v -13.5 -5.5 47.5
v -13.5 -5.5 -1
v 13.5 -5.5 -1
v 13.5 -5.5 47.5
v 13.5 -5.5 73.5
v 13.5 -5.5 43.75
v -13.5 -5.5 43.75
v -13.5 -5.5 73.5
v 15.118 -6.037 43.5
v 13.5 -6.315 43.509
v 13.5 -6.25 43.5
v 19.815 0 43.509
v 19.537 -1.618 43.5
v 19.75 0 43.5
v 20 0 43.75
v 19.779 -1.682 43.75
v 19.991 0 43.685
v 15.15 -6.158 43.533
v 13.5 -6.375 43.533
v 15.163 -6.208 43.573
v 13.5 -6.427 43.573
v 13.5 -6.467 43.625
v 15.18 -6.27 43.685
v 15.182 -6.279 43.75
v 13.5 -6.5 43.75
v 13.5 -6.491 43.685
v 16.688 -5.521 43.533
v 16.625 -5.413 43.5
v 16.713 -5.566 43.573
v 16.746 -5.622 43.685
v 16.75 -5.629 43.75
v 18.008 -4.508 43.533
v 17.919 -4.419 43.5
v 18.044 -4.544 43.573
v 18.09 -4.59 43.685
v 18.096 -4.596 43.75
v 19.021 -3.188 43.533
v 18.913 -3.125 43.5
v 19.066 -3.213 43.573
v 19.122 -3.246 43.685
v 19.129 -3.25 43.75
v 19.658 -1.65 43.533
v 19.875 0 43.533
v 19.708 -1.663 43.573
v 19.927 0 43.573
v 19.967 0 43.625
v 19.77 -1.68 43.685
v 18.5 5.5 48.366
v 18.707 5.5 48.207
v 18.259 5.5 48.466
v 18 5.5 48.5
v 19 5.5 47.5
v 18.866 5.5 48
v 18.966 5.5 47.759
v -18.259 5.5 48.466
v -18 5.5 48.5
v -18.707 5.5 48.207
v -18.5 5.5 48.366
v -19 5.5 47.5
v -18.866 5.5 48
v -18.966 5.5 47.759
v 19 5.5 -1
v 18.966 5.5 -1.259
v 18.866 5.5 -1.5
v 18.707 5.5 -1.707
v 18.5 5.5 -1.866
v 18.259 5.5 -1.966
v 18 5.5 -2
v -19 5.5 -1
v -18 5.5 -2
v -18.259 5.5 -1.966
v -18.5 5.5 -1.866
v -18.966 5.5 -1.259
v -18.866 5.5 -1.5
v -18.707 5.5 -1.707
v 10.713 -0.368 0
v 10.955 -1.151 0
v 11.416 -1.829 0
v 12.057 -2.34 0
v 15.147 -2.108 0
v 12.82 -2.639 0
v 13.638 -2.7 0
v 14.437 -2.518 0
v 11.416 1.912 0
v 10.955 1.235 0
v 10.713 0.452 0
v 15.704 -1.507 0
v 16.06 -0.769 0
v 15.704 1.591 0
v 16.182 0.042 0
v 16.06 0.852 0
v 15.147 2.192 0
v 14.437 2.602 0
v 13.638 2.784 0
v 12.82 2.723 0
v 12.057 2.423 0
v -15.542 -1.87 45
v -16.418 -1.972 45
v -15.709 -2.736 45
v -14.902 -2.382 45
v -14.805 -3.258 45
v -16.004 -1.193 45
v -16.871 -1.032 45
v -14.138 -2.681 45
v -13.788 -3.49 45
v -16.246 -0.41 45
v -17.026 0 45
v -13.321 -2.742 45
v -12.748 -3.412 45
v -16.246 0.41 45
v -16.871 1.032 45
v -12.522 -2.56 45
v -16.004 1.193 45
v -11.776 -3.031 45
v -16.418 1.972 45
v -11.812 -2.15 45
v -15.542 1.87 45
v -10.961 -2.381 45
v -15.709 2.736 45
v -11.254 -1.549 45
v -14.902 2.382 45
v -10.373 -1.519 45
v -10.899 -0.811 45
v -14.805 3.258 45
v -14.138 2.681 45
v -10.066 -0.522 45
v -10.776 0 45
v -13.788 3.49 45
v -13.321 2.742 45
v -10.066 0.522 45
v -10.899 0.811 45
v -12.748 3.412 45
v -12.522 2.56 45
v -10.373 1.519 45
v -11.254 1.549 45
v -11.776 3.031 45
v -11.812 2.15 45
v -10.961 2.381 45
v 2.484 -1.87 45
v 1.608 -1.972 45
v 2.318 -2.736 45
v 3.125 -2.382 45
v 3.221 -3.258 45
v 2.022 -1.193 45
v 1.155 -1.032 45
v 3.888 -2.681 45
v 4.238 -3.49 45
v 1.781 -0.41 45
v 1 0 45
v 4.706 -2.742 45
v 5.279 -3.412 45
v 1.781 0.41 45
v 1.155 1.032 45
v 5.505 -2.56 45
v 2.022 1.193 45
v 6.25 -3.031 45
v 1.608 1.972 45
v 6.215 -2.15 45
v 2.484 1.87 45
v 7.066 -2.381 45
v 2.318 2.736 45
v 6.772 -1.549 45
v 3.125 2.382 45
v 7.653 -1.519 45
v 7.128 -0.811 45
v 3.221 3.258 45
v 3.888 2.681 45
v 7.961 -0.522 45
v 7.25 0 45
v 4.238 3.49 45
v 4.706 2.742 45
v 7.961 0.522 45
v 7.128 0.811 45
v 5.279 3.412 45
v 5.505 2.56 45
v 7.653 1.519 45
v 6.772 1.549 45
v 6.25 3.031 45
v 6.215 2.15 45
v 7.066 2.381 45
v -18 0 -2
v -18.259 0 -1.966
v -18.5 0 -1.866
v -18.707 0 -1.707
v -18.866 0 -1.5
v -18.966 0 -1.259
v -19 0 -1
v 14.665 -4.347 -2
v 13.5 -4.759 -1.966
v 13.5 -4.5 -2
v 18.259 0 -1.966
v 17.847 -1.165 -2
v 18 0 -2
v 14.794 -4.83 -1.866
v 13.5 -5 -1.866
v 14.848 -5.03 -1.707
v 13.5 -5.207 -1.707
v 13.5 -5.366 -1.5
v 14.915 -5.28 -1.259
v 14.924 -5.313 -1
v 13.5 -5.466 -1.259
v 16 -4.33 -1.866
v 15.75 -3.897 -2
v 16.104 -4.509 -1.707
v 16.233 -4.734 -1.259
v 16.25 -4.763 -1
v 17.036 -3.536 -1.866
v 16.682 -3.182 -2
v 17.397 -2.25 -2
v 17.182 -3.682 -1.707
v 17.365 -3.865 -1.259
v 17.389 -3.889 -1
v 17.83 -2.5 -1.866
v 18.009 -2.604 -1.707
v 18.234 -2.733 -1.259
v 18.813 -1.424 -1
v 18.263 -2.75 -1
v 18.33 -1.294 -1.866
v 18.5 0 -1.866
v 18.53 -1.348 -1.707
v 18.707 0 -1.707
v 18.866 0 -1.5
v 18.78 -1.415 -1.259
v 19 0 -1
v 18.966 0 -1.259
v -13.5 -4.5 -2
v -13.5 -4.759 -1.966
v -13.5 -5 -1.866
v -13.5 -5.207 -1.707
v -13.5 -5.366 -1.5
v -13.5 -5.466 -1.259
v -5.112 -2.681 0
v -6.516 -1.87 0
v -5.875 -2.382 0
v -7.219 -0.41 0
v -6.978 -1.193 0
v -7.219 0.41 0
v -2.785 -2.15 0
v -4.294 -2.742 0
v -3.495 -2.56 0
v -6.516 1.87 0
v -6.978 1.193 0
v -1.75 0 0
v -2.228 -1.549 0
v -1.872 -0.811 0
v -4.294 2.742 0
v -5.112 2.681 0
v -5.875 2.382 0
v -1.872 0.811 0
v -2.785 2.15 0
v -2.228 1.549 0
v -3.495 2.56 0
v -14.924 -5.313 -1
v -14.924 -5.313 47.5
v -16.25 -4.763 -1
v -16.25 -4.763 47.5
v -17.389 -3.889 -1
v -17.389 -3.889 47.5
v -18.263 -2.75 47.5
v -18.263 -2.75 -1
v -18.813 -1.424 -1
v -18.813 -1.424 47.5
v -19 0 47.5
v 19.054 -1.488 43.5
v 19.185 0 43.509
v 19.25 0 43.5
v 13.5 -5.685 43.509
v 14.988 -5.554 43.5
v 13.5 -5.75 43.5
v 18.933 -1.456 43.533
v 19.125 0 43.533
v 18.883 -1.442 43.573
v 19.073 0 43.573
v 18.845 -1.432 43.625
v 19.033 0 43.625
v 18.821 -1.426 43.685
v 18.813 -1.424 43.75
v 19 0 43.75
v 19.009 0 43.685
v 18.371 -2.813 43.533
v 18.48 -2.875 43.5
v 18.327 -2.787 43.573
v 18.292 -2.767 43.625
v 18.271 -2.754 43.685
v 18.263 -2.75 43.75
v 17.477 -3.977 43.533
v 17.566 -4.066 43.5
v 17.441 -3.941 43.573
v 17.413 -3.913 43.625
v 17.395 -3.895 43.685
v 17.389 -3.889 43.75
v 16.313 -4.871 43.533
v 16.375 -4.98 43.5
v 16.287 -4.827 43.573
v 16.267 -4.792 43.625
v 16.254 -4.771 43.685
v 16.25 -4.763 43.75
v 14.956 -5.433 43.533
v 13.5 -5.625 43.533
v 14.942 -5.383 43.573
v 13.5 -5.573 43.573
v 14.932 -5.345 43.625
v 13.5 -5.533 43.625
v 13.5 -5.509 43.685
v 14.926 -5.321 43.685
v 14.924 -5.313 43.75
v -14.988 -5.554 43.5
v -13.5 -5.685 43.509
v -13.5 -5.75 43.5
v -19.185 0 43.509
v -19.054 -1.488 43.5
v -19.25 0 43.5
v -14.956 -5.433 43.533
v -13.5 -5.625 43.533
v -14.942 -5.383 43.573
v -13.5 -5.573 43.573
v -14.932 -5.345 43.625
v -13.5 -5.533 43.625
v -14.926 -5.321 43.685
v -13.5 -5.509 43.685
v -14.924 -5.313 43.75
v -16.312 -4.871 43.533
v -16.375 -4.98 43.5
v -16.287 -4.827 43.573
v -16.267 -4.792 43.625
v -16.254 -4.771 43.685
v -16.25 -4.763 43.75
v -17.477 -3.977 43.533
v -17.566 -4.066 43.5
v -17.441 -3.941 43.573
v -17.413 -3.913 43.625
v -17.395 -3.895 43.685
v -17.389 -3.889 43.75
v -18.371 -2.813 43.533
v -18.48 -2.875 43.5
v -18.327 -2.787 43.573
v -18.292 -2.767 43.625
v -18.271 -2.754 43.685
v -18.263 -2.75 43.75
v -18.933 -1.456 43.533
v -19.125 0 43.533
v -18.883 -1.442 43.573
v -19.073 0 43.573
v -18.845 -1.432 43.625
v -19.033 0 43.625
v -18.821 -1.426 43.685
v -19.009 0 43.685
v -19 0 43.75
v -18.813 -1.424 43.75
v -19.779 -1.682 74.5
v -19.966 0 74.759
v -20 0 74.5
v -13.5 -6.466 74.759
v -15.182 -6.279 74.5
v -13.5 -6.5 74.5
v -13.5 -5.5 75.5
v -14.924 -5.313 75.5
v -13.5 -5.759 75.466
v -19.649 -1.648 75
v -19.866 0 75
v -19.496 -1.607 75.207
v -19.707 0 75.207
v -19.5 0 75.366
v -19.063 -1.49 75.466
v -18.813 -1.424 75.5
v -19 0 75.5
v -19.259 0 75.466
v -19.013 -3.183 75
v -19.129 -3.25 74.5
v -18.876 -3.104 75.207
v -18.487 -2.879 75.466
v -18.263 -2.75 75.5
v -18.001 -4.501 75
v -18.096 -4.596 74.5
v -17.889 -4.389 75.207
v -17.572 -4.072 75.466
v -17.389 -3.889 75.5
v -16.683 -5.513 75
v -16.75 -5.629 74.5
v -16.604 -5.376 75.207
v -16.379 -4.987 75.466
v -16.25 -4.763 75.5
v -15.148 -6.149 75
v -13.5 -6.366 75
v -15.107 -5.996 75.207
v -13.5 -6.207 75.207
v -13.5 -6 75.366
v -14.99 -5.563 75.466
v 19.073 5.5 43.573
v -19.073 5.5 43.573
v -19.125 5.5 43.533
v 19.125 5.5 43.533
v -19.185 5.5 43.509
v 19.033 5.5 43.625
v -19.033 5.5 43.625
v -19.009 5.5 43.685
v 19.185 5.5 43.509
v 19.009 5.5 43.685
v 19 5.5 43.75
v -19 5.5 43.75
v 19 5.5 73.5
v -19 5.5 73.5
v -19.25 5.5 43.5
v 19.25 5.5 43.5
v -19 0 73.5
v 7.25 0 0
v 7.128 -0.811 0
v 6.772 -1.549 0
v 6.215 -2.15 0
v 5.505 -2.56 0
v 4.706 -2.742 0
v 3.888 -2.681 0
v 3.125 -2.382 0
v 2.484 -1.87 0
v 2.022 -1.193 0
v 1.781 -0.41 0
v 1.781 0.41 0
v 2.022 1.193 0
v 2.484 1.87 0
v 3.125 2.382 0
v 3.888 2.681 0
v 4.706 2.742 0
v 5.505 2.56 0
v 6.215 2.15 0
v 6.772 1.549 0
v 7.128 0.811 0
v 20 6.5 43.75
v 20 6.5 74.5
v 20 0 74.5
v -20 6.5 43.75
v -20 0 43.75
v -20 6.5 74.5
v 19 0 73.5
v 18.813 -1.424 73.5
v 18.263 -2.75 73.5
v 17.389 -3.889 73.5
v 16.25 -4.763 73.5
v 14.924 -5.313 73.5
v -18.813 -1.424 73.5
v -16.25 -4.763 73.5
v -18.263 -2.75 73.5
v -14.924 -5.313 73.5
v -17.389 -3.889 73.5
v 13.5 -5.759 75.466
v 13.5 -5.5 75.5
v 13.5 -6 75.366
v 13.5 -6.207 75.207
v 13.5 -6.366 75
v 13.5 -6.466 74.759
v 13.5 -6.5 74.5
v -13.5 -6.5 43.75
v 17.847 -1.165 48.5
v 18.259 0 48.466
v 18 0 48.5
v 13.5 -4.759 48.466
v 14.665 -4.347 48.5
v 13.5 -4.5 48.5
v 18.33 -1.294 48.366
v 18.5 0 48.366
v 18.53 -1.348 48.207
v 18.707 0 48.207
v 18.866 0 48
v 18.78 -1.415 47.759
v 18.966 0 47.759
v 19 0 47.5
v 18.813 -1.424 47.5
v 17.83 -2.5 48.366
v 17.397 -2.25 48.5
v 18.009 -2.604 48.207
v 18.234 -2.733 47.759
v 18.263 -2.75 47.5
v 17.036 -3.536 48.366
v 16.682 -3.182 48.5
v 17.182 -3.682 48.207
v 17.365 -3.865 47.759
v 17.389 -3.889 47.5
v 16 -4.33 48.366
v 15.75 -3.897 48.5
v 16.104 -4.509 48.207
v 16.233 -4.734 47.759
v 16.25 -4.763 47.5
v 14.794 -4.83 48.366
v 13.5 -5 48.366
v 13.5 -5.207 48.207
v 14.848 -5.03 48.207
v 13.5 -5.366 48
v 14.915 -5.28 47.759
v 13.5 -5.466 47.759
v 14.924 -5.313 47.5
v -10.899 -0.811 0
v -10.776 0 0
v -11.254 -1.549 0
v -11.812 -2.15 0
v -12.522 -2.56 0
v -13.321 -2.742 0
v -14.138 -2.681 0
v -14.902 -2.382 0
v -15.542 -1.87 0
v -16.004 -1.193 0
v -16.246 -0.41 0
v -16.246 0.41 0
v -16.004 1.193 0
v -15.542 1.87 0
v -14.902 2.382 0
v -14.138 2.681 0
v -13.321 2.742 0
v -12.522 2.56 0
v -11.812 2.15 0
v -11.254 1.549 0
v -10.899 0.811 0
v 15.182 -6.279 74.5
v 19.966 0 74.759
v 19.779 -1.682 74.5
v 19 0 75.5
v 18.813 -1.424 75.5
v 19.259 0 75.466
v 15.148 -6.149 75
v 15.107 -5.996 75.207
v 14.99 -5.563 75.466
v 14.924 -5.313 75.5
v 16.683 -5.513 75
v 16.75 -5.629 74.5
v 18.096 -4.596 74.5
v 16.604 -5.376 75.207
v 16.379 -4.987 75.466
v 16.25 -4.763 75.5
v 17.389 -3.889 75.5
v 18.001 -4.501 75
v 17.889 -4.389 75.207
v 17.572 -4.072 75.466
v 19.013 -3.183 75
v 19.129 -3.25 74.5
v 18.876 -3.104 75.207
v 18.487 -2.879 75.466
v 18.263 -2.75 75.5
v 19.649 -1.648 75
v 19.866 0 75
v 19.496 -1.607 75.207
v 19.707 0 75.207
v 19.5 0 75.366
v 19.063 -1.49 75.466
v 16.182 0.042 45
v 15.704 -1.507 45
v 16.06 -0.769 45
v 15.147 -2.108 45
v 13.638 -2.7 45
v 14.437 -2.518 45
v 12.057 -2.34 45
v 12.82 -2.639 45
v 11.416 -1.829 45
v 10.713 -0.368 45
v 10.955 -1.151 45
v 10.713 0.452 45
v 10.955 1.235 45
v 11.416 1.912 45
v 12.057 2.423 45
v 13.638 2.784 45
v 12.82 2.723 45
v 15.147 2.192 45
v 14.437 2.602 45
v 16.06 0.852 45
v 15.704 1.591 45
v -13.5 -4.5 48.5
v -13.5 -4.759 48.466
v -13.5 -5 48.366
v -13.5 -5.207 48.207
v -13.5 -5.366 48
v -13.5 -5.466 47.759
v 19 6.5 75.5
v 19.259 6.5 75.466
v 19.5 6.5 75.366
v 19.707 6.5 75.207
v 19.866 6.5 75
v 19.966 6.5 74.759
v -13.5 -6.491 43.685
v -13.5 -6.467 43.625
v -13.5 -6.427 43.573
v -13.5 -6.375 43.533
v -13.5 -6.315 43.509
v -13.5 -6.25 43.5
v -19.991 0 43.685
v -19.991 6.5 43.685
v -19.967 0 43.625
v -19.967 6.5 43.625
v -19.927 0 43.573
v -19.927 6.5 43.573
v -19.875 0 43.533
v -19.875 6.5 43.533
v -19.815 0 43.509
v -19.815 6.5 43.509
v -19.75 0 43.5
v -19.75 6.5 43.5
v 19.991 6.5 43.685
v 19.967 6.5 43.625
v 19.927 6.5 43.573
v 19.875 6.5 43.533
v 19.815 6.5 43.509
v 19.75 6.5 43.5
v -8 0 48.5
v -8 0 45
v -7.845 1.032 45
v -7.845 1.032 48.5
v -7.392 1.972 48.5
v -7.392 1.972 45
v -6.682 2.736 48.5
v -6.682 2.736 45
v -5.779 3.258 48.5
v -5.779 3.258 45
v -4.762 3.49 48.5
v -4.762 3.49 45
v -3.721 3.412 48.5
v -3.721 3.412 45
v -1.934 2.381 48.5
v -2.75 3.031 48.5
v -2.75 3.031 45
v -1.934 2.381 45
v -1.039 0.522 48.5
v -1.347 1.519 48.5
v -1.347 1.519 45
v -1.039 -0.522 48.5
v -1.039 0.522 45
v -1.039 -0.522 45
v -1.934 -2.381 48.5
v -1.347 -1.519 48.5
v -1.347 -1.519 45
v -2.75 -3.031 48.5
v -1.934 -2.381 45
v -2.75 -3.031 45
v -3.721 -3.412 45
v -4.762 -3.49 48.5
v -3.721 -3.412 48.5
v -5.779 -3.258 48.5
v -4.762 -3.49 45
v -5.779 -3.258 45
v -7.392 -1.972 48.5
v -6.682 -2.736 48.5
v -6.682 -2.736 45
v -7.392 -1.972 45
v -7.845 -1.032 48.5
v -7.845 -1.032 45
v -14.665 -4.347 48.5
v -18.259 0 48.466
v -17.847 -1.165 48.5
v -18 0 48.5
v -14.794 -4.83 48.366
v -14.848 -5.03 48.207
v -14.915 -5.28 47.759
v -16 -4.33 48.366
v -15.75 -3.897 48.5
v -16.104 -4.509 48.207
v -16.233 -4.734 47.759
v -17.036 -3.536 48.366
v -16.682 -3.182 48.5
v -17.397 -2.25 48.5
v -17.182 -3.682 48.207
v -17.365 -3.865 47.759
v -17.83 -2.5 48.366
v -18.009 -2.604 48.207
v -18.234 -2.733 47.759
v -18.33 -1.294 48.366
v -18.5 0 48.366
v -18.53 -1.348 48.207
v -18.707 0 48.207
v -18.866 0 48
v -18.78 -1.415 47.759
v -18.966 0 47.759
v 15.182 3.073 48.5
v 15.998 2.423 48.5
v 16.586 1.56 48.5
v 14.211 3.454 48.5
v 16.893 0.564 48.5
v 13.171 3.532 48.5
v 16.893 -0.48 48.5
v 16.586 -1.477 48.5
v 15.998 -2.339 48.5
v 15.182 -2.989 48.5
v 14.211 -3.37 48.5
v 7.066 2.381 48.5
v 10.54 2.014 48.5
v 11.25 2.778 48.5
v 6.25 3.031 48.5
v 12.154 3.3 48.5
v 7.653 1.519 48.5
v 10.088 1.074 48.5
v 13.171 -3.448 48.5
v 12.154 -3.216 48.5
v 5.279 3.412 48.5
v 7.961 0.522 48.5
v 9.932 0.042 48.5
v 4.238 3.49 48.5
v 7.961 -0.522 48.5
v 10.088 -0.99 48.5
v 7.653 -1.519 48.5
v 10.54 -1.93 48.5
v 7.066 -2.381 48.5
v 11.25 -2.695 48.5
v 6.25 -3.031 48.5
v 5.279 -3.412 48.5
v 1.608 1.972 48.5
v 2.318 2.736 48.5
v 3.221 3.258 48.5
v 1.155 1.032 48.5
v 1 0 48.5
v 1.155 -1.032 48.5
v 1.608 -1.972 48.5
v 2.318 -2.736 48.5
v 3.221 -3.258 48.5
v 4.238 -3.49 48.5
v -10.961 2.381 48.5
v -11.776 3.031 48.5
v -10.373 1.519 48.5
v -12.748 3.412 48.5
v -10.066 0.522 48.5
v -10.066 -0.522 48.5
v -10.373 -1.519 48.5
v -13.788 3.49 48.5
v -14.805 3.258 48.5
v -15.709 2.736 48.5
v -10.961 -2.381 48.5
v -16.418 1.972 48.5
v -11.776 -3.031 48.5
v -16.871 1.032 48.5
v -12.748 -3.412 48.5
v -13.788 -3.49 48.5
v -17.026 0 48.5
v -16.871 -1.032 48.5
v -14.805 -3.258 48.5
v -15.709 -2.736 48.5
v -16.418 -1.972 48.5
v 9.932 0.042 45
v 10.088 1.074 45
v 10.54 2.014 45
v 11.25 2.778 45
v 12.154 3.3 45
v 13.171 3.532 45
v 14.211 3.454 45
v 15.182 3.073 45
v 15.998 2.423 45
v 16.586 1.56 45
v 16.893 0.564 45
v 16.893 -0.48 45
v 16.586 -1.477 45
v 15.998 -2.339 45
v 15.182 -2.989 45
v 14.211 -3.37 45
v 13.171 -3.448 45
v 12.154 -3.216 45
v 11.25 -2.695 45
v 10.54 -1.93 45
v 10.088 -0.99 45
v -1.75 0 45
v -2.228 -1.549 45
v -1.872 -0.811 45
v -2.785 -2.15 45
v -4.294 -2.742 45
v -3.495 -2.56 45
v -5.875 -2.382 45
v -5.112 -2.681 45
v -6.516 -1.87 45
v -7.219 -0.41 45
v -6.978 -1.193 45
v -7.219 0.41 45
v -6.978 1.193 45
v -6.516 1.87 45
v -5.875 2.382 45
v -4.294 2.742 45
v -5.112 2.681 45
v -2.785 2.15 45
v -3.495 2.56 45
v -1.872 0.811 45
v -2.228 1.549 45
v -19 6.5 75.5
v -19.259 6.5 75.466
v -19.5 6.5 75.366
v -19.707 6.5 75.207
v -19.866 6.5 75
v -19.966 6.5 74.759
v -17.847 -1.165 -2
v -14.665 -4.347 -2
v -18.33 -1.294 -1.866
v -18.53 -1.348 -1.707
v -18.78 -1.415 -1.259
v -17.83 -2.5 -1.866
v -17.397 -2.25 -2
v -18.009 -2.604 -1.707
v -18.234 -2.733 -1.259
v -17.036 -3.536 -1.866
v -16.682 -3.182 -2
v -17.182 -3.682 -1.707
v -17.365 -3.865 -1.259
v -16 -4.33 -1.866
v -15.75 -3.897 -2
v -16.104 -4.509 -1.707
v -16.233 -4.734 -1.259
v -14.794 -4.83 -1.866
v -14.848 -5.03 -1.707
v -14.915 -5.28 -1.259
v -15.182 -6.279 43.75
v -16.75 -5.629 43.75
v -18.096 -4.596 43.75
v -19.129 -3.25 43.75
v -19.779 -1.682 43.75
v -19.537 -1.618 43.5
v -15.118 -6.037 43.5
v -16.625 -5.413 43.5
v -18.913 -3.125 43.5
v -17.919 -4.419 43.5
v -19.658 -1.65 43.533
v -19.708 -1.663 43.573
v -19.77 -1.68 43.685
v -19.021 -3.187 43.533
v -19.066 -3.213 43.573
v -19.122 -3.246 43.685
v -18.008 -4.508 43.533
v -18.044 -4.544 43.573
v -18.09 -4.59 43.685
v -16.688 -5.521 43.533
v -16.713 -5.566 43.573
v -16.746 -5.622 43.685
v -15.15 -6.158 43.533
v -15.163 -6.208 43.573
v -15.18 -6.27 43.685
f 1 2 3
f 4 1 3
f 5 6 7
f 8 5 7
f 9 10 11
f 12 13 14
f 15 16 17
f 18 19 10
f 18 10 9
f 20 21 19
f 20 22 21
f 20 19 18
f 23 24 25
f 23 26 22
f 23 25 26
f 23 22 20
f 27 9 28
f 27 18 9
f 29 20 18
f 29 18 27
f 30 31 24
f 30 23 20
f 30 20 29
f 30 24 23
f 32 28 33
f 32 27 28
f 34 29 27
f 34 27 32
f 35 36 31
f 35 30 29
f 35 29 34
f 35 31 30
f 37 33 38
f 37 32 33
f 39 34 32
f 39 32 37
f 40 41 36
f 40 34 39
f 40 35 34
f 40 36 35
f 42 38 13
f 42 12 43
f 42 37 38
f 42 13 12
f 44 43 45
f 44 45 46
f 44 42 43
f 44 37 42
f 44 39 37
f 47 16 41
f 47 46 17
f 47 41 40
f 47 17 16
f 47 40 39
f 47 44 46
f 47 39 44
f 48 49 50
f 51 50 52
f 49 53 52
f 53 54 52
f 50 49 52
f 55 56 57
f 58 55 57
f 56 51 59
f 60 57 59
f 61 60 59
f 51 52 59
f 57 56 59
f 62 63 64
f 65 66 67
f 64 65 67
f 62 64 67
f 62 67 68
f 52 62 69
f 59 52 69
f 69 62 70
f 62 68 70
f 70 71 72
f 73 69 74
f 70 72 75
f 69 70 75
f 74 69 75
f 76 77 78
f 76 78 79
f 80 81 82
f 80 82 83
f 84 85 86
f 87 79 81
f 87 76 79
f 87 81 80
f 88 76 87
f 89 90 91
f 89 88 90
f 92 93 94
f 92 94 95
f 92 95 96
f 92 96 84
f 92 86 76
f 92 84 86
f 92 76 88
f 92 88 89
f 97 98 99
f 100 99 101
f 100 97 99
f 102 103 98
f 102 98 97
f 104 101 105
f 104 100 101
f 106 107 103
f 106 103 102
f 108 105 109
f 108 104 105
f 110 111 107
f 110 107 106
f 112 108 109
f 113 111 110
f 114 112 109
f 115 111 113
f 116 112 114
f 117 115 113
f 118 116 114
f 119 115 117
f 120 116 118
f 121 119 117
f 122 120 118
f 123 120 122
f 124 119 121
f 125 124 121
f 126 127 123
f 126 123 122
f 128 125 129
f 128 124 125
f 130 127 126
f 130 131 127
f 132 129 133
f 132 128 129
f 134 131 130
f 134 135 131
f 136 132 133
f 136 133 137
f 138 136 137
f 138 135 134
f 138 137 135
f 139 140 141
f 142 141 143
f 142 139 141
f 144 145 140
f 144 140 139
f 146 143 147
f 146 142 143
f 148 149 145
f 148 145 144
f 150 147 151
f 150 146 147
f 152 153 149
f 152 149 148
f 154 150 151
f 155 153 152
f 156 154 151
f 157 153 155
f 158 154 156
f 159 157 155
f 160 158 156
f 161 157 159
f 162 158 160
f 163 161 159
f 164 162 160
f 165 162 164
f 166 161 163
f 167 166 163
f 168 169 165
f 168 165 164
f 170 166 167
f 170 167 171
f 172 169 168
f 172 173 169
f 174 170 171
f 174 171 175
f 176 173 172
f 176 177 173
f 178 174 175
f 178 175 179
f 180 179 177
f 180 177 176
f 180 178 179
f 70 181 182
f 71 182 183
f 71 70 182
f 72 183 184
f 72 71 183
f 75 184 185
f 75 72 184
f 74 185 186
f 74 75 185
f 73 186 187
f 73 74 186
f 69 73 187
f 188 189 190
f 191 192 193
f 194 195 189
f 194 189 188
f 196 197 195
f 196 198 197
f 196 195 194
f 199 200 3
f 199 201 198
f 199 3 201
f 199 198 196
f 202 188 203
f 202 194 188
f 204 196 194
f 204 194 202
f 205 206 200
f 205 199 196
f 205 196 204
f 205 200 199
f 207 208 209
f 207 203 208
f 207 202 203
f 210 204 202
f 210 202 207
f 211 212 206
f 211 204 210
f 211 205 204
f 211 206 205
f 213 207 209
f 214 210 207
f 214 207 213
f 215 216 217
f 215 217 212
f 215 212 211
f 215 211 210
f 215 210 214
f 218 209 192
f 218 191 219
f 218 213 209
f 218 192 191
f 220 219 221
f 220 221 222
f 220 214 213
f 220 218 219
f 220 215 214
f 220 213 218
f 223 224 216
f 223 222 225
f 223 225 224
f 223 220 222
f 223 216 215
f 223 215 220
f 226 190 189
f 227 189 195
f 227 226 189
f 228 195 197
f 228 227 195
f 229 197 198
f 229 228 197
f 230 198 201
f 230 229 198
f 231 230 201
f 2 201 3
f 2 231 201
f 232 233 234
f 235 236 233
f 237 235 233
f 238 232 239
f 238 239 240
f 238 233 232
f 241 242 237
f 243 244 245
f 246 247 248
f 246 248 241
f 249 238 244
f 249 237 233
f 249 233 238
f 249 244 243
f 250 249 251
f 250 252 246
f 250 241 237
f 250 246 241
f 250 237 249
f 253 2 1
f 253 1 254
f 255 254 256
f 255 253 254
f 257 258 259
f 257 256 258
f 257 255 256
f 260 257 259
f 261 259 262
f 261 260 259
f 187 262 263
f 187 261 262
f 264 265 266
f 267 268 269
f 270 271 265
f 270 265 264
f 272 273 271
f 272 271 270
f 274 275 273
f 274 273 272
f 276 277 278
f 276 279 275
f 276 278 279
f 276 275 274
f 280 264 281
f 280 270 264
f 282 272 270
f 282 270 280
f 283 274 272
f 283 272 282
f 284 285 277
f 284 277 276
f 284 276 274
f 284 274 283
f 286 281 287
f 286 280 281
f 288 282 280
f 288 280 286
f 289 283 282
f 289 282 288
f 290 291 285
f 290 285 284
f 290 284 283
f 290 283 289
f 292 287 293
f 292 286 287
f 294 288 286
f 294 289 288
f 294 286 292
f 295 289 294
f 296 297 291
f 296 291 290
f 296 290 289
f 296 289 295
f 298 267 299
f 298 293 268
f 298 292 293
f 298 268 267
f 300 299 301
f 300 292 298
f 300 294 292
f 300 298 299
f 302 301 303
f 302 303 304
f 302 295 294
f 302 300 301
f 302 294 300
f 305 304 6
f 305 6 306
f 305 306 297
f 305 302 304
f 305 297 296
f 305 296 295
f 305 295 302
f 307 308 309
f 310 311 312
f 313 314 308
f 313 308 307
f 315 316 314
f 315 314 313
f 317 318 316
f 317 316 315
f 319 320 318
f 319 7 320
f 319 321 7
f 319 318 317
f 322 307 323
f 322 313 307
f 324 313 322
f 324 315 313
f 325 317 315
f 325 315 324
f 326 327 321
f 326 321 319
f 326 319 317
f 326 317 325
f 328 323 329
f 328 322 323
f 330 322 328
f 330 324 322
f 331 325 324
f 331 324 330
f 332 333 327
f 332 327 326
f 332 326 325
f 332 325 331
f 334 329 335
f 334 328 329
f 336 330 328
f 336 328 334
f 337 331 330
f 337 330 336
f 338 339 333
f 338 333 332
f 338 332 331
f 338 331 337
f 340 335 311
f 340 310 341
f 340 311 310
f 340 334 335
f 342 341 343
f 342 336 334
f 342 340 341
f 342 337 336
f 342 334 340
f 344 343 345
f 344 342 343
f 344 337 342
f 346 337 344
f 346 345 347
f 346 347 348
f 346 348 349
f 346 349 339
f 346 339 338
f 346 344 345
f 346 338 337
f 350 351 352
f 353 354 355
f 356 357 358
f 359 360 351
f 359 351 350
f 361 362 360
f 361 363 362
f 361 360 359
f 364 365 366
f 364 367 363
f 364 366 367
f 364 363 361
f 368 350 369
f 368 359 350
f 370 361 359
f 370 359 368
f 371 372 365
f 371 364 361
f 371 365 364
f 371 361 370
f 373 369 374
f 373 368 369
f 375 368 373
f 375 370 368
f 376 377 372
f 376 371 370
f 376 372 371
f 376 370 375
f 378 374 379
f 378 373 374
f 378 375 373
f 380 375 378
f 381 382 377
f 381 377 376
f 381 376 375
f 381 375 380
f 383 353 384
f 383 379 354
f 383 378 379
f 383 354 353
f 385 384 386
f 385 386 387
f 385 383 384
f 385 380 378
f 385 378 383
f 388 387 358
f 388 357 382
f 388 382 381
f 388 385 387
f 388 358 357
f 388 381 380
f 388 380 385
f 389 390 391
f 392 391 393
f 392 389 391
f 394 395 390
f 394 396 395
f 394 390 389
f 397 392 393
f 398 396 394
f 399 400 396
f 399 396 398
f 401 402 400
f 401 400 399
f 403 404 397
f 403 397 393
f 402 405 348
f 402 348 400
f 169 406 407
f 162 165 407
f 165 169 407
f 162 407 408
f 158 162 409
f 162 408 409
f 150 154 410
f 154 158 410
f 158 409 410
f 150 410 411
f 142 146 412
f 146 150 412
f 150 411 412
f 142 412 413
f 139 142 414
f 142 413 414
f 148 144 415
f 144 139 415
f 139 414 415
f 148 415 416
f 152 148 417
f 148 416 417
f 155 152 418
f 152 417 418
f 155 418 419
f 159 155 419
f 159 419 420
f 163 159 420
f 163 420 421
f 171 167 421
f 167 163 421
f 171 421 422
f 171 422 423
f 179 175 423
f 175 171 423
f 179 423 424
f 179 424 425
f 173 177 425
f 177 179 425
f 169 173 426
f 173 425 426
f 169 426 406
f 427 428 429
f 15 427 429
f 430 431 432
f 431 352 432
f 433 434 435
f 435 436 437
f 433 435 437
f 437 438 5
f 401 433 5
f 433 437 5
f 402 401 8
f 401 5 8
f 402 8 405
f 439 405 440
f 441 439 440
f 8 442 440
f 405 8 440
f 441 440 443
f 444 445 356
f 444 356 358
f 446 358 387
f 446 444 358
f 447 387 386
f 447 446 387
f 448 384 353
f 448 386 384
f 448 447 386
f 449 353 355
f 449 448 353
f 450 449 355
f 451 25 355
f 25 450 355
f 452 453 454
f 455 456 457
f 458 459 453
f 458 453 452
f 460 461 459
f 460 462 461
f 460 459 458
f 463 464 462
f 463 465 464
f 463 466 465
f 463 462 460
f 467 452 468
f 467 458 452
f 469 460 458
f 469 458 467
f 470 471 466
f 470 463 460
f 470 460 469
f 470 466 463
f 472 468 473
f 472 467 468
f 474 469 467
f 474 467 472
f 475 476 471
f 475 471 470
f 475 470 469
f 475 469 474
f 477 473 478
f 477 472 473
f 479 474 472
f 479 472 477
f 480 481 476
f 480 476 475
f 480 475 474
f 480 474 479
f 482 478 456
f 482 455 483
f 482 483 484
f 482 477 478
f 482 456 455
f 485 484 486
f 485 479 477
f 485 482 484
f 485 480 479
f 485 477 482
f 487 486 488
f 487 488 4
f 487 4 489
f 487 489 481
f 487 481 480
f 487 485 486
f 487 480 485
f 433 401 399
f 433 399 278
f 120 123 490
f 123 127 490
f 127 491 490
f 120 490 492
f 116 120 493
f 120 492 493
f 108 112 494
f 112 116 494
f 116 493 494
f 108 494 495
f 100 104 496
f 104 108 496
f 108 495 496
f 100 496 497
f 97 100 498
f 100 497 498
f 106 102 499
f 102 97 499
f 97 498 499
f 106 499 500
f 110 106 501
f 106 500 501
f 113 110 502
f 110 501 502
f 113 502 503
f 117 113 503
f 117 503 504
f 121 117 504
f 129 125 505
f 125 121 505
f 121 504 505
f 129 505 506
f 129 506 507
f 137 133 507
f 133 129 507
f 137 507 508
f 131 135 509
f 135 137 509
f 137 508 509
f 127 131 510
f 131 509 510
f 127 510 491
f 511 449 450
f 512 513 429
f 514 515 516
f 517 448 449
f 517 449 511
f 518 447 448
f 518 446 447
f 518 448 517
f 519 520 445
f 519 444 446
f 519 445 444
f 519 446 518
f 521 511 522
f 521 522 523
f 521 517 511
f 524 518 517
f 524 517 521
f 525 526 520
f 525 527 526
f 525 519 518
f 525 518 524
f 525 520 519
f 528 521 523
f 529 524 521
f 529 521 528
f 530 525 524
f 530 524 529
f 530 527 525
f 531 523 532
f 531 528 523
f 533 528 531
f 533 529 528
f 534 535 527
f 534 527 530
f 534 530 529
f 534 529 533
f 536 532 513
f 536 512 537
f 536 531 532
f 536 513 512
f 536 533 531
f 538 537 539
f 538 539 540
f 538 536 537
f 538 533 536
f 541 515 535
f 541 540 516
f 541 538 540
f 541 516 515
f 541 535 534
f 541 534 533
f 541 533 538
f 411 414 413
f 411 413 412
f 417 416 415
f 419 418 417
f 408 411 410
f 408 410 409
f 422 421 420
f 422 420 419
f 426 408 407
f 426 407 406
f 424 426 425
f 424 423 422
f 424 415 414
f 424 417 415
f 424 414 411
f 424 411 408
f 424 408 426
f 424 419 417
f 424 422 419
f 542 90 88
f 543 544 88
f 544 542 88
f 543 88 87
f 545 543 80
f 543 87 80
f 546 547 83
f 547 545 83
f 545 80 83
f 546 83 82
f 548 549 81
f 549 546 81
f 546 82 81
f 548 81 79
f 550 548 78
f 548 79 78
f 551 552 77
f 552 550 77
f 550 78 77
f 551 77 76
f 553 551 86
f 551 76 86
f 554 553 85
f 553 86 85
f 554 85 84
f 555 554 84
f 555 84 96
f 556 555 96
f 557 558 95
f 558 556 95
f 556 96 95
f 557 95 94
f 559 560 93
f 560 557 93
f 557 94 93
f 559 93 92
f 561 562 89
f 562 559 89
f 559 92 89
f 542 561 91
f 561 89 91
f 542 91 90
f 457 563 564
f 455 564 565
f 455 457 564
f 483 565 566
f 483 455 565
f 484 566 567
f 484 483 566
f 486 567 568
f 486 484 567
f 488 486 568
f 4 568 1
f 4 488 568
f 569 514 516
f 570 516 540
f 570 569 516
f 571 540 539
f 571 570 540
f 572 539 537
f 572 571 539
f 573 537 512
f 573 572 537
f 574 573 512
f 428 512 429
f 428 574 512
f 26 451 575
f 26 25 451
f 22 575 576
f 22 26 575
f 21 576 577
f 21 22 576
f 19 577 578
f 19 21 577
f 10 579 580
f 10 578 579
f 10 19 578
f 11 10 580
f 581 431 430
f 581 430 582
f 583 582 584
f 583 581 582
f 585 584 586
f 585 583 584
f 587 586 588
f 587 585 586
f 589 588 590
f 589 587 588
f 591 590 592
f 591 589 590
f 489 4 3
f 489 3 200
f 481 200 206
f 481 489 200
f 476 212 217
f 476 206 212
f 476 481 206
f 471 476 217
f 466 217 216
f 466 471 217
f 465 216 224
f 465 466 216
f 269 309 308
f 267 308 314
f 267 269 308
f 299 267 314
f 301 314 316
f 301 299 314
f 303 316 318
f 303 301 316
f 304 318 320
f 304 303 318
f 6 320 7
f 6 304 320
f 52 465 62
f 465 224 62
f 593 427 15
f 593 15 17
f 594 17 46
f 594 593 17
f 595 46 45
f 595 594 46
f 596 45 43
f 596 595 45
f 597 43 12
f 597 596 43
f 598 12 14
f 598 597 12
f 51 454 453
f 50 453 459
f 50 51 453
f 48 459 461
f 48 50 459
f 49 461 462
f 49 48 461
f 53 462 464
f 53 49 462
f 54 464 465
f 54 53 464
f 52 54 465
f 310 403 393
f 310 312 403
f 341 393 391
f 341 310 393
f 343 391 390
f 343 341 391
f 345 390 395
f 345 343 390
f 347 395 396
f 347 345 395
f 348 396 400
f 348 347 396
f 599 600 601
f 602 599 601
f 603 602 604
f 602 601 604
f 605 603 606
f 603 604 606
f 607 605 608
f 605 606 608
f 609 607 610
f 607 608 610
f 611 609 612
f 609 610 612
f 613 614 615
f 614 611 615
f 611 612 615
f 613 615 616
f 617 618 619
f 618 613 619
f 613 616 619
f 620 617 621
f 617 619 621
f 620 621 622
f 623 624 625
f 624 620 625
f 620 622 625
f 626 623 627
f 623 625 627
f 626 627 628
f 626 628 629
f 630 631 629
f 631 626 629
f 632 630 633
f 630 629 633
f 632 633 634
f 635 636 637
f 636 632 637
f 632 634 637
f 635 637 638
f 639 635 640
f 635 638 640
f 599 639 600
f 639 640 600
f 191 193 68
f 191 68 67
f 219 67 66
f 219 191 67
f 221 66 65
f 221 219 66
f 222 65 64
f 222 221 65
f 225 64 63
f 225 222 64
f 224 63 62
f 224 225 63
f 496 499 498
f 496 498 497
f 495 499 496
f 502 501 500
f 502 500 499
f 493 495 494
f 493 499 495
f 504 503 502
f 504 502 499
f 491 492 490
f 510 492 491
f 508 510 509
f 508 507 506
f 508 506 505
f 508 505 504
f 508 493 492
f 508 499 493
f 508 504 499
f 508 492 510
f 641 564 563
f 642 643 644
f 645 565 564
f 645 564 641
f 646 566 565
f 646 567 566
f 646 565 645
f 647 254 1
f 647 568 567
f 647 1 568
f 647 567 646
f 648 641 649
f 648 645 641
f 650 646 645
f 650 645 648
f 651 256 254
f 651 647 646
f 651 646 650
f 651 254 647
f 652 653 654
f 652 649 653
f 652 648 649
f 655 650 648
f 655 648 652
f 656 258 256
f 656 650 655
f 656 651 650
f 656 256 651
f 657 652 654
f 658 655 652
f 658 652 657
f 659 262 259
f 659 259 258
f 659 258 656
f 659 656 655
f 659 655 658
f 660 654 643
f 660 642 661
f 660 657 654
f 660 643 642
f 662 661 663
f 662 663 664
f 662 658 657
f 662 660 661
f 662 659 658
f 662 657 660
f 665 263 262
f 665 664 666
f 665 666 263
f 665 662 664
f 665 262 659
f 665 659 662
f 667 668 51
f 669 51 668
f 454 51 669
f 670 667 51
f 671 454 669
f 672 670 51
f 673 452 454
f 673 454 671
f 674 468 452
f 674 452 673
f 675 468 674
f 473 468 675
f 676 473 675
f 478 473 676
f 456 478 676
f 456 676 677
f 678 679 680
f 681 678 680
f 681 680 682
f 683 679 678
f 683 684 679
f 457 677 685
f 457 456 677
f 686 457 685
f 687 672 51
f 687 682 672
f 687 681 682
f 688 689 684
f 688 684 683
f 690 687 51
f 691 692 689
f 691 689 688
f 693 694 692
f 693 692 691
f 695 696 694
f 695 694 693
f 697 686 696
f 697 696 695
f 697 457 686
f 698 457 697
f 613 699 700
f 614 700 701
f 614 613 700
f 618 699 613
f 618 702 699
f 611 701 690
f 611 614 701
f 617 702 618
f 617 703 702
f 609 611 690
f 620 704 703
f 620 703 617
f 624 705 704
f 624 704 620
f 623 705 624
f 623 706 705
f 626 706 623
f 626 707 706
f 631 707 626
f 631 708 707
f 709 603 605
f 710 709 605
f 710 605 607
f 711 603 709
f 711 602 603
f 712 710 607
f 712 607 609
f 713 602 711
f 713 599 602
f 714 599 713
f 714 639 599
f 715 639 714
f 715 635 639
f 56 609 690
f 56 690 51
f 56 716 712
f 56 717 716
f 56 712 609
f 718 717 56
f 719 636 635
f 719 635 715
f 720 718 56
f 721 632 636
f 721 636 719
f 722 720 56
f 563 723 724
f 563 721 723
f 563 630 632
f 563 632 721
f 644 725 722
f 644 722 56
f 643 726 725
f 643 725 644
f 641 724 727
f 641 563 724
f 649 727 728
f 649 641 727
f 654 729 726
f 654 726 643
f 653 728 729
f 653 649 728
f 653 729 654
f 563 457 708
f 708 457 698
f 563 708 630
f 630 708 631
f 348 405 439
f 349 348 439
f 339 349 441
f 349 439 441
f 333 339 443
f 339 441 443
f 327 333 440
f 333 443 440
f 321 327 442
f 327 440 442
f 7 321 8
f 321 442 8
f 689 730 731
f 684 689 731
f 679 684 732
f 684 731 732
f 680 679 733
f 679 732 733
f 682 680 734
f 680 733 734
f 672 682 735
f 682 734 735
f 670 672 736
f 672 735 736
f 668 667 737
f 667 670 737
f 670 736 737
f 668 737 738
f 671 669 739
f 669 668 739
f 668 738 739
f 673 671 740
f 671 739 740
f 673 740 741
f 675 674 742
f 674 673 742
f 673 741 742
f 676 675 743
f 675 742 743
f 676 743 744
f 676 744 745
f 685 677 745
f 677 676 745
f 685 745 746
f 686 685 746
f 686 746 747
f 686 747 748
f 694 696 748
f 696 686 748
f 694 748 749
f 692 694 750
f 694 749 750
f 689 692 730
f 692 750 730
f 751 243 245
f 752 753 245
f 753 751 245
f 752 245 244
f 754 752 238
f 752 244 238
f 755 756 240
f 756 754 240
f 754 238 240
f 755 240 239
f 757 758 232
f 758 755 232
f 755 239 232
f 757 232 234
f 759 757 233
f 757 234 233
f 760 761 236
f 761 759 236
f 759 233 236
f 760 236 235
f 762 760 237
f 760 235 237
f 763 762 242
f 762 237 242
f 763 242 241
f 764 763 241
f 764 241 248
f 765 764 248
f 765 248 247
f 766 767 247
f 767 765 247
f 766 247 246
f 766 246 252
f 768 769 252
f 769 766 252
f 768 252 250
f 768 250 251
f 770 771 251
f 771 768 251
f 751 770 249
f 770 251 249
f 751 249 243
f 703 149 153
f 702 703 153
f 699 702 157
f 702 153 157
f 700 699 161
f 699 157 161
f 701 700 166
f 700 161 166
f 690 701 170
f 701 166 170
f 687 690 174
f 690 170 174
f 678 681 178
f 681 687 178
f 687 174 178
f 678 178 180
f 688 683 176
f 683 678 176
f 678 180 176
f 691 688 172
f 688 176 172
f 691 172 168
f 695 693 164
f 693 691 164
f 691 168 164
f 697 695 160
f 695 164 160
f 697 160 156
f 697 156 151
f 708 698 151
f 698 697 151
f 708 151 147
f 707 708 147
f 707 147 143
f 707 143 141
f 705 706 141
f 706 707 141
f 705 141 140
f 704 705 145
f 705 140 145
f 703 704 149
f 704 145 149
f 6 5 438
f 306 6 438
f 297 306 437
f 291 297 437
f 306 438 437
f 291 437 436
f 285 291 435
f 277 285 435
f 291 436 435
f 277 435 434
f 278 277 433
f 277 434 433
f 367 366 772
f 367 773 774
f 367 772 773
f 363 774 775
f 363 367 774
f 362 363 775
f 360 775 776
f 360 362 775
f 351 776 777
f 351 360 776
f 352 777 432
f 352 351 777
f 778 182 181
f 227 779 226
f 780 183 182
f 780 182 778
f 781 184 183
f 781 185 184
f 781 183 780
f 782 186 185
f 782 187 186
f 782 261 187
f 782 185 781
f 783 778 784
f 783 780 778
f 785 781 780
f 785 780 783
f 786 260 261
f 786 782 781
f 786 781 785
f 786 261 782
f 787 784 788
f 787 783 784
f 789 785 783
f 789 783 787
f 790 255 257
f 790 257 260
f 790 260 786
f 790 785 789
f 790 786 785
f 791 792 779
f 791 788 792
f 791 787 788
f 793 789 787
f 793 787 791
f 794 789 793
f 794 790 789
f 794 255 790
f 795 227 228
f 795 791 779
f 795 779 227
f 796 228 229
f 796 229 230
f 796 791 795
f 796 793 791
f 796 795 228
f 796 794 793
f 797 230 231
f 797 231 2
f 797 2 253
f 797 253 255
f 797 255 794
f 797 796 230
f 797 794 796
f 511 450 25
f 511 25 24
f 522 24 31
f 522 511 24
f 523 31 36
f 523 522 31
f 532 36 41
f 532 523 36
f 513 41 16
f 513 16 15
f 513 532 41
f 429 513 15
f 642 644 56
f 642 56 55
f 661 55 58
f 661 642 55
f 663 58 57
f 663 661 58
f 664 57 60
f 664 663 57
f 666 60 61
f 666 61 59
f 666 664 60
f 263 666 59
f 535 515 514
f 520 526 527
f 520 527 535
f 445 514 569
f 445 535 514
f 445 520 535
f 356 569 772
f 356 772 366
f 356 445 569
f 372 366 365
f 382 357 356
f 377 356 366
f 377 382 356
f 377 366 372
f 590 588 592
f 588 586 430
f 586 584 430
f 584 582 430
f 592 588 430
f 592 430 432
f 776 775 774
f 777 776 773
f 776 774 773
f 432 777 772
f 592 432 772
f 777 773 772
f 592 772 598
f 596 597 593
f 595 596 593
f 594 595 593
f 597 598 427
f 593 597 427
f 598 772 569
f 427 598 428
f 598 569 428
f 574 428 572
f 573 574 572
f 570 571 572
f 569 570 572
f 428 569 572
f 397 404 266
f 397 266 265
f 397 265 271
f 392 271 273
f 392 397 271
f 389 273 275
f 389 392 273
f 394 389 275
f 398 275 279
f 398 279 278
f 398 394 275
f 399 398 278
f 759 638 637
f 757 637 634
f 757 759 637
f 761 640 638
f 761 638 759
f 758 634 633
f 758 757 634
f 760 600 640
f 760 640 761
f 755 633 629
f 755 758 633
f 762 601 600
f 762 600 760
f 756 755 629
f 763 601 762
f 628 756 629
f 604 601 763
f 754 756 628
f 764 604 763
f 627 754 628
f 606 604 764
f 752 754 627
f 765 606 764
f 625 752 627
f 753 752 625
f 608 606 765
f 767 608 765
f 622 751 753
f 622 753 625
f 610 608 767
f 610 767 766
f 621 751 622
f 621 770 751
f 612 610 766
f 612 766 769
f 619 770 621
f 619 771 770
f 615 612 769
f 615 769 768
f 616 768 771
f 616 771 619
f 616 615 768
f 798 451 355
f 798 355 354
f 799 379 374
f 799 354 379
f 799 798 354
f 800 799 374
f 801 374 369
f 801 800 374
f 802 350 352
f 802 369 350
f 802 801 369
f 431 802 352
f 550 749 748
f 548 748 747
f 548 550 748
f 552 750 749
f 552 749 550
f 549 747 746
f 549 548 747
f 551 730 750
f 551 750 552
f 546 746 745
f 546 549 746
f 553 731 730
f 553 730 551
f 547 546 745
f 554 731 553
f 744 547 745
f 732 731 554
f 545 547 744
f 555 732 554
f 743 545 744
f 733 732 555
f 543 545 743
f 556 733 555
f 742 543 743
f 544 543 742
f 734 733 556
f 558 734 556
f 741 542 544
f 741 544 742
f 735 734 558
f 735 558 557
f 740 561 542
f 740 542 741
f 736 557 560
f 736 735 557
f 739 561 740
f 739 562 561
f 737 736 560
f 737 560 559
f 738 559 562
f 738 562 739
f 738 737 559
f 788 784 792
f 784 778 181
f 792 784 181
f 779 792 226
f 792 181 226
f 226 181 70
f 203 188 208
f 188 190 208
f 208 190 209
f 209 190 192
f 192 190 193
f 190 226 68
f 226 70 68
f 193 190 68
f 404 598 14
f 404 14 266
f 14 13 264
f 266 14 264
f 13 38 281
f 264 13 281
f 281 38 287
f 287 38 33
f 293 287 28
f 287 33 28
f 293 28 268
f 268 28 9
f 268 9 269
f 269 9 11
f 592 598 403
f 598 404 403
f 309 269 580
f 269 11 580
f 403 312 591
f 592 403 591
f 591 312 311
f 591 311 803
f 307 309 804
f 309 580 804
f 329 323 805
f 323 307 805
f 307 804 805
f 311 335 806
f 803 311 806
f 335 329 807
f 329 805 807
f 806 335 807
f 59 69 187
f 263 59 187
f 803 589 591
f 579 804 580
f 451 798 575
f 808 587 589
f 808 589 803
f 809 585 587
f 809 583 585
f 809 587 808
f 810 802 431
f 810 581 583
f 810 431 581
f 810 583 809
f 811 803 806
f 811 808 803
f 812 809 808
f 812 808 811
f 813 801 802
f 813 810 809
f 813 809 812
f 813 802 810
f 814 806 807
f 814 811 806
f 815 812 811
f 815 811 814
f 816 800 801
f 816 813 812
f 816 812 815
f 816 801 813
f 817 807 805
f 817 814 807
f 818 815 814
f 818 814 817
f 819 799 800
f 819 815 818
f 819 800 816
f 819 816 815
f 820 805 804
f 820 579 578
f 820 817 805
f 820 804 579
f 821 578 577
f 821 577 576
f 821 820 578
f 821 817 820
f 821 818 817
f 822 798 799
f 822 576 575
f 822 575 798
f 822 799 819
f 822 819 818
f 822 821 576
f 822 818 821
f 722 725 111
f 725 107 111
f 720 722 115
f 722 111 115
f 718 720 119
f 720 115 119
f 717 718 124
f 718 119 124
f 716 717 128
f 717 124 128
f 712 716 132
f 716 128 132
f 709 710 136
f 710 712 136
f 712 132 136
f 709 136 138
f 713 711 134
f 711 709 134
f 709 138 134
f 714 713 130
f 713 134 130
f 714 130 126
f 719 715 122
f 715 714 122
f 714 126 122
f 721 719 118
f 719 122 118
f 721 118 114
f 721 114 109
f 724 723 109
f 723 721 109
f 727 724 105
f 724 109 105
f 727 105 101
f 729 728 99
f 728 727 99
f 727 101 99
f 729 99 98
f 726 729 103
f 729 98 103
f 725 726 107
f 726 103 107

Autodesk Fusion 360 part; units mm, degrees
sketch "Sketch1" plane through (0, 0, 0) normal (0, 0, 1) x (1, 0, 0)
  circle A0 centre (4.5, 0) radius 2.75
  circle A1 centre (-4.5, 0) radius 2.75
  circle A2 centre (13.4322, 0.0419) radius 2.75
  circle A3 centre (-13.5265, 0) radius 2.75
  line L0 (-19, 5.5) -> (19, 5.5)
  line L1 (19, 5.5) -> (19, -5.5)
  line L2 (19, -5.5) -> (-19, -5.5)
  line L3 (-19, -5.5) -> (-19, 5.5)
  circle A4 centre (-4.5, 0) radius 3.5
  circle A5 centre (4.5, 0) radius 3.5
  circle A6 centre (13.4322, 0.0419) radius 3.5
  circle A7 centre (-13.5265, 0) radius 3.5
  line L4 (20, 6.5) -> (20, -6.5)
  line L5 (20, -6.5) -> (-20, -6.5)
  line L6 (-20, -6.5) -> (-20, 6.5)
  line L7 (-20, 6.5) -> (20, 6.5)
  dimension "d1" = 5.5
  dimension "d2" = 5.5
  dimension "d3" = 5.5
  dimension "d4" = 5.5
  dimension "d5" = 7
  dimension "d6" = 7
  dimension "d7" = 7
  dimension "d8" = 7
  dimension "d9" = 5.5
  dimension "d10" = 19
  dimension "d11" = 19
  dimension "d12" = 5.5
  dimension "d23" = 1
extrude "Extrude1" add sketch "Sketch1" against normal blind 2 contours A0 | A1 | A2 | A3 | L0 L1 L2 L3 | A4 | A5 | A6 | A7 makes body 1
extrude "Extrude2" add sketch "Sketch1" along normal blind 45 contours L0 L1 L2 L3 | A4 | A5 | A6 | A7 bodies 1
sketch "Sketch2" plane through (0, 0, 45) normal (0, 0, 1) x (-1, 0, 0)
  circle A0 centre (13.5265, 0) radius 2.75
  circle A1 centre (-13.4322, -0.0419) radius 2.75
  circle A2 centre (4.5, 0) radius 2.75
  circle A3 centre (-4.5, 0) radius 2.75
  line L0 (-19, 5.5) -> (-19, -5.5)
  line L1 (-19, -5.5) -> (19, -5.5)
  line L2 (19, -5.5) -> (19, 5.5)
  line L3 (19, 5.5) -> (-19, 5.5)
  circle A4 centre (13.5265, 0) radius 3.5
  circle A5 centre (4.5, 0) radius 2.75
  circle A6 centre (13.5265, 0) radius 2.75
  circle A7 centre (13.5265, 0) radius 2.75
  circle A8 centre (4.5, 0) radius 3.5
  line L4 (-19, -5.5) -> (-19, 5.5)
  line L5 (-19, 5.5) -> (19, 5.5)
  line L6 (19, 5.5) -> (19, -5.5)
  line L7 (19, -5.5) -> (-19, -5.5)
  line L8 (19, 5.5) -> (-19, 5.5)
  line L9 (-19, 5.5) -> (19, 5.5)
  circle A9 centre (-13.4322, -0.0419) radius 2.75
  circle A10 centre (-13.4322, -0.0419) radius 2.75
  circle A11 centre (-13.4322, -0.0419) radius 2.75
  circle A12 centre (-13.4322, -0.0419) radius 3.5
  circle A13 centre (-4.5, 0) radius 3.5
extrude "Extrude3" add sketch "Sketch2" along normal blind 3.5 contours L0 L1 L2 L3 L4 L5 L6 L7 L8 L9 bodies 1
fillet "Fillet1" radius 5.5 2 edges at (-19, -5.5, 23.25) (19, -5.5, 23.25) on bodies 1
fillet "Fillet2" radius 1 10 edges at (19, 2.75, -2) (17.3891, -3.8891, -2) (0, -5.5, -2) (-17.3891, -3.8891, -2) (-19, 2.75, -2) (-19, 2.75, 48.5) (-17.3891, -3.8891, 48.5) (0, -5.5, 48.5) (17.3891, -3.8891, 48.5) (19, 2.75, 48.5) on bodies 1
sketch "Sketch3" plane through (0, 0, 48.5) normal (0, 0, 1) x (-1, 0, 0)
  line L0 (18, -5.5) -> (18, 0)
  arc A0 (18, 0) -> (13.5, 4.5) centre (13.5, 0) ccw
  line L1 (13.5, 4.5) -> (-13.5, 4.5)
  arc A1 (-13.5, 4.5) -> (-18, 0) centre (-13.5, 0) ccw
  line L2 (-18, 0) -> (-18, -5.5)
  line L3 (-18, -5.5) -> (18, -5.5)
  circle A2 centre (4.5, 0) radius 3.5
  circle A3 centre (13.5265, 0) radius 3.5
  circle A4 centre (-4.5, 0) radius 3.5
  circle A5 centre (-13.4322, -0.0419) radius 3.5
  line L4 (-20, 6.5) -> (20, 6.5)
  line L5 (-19, 5.5) -> (19, 5.5)
  line L6 (20, 6.5) -> (20, -6.5)
  line L7 (19, 5.5) -> (19, -5.5)
  line L8 (19, -5.5) -> (-19, -5.5)
  line L9 (20, -6.5) -> (-20, -6.5)
  line L10 (-20, -6.5) -> (-20, 6.5)
  line L11 (-19, -5.5) -> (-19, 5.5)
  circle A6 centre (-13.4322, -0.0419) radius 2.75
extrude "Extrude4" add sketch "Sketch3" against normal blind 5 separate body contours L4 L6 L9 L10 makes body 2
move_face "OffsetFaces1" offset 25 1 faces at (6, 6.1667, 48.5) on bodies 2
sketch "Sketch4" plane through (0, 0, 73.5) normal (0, 0, 1) x (-1, 0, 0)
  line L0 (19, -5.5) -> (-19, -5.5)
  line L1 (-19, -5.5) -> (-19, 5.5)
  line L2 (-19, 5.5) -> (19, 5.5)
  line L3 (19, 5.5) -> (19, -5.5)
  line L4 (-20, -6.5) -> (20, -6.5)
  line L5 (20, -6.5) -> (20, 6.5)
  line L6 (20, 6.5) -> (-20, 6.5)
  line L7 (-20, 6.5) -> (-20, -6.5)
  line L8 (20, -6.5) -> (-20, -6.5)
  line L9 (20, 6.5) -> (20, -6.5)
  line L10 (-20, 6.5) -> (20, 6.5)
  line L11 (-20, -6.5) -> (-20, 6.5)
extrude "Extrude5" add sketch "Sketch4" along normal blind 2 contours L0 L1 L2 L3 | L4 L5 L6 L7 L8 L9 L10 L11 bodies 2
fillet "Fillet3" radius 5.5 2 edges at (19, -5.5, 58.5) (-19, -5.5, 58.5) on bodies 2
fillet "Fillet4" radius 6.5 2 edges at (-20, -6.5, 59.5) (20, -6.5, 59.5) on bodies 2
fillet "Fillet5" radius 1 5 edges at (20, 3.25, 75.5) (18.0962, -4.5962, 75.5) (0, -6.5, 75.5) (-18.0962, -4.5962, 75.5) (-20, 3.25, 75.5) on bodies 2
fillet "Fillet6" radius 0.25 10 edges at (20, 3.25, 43.5) (18.0962, -4.5962, 43.5) (0, -6.5, 43.5) (-18.0962, -4.5962, 43.5) (-20, 3.25, 43.5) (-19, 2.75, 43.5) (-17.3891, -3.8891, 43.5) (0, -5.5, 43.5) (17.3891, -3.8891, 43.5) (19, 2.75, 43.5) on bodies 2
sketch "Sketch5" plane through (0, 0, 48.5) normal (0, 0, 1) x (-1, 0, 0)
  line L0 (18, -5.5) -> (18, 0)
  arc A0 (18, 0) -> (13.5, 4.5) centre (13.5, 0) ccw
  line L1 (13.5, 4.5) -> (-13.5, 4.5)
  arc A1 (-13.5, 4.5) -> (-18, 0) centre (-13.5, 0) ccw
  line L2 (-18, 0) -> (-18, -5.5)
  line L3 (-18, -5.5) -> (18, -5.5)
  circle A2 centre (4.5, 0) radius 3.5
  circle A3 centre (13.5265, 0) radius 3.5
  circle A4 centre (-4.5, 0) radius 3.5
  circle A5 centre (-13.4322, -0.0419) radius 3.5
  line L4 (-19, 0) -> (-19, -6.5)
  line L5 (-19, -6.5) -> (19, -6.5)
  line L6 (19, -6.5) -> (19, 0)
  arc A6 (19, 0) -> (13.5, 5.5) centre (13.5, 0) ccw
  line L7 (13.5, 5.5) -> (-13.5, 5.5)
  arc A7 (-13.5, 5.5) -> (-19, 0) centre (-13.5, 0) ccw
  arc A8 (19, 0) -> (13.5, 5.5) centre (13.5, 0) ccw
  line L8 (19, 0) -> (19, -5.5)
  line L9 (19, -5.5) -> (-19, -5.5)
  line L10 (-19, -5.5) -> (-19, 0)
  arc A9 (-13.5, 5.5) -> (-19, 0) centre (-13.5, 0) ccw
  line L11 (-13.5, 5.5) -> (13.5, 5.5)
  line L12 (13.5, 4.5) -> (13.5, 5.5)
  arc A10 (18, 0) -> (13.5, 4.5) centre (13.5, 0) ccw
  line L13 (18, 0) -> (19, 0)
  arc A11 (19, 0) -> (13.5, 5.5) centre (13.5, 0) ccw
  line L14 (-13.5, 4.5) -> (-13.5, 5.5)
  line L15 (-13.5, 4.5) -> (13.5, 4.5)
  line L16 (13.5, 4.5) -> (13.5, 5.5)
  line L17 (13.5, 5.5) -> (-13.5, 5.5)
  line L18 (19, -5.5) -> (18, -5.5)
  line L19 (19, -5.5) -> (19, 0)
  line L20 (18, 0) -> (19, 0)
  line L21 (18, 0) -> (18, -5.5)
  line L22 (-18, -5.5) -> (-19, -5.5)
  line L23 (-18, -5.5) -> (-18, 0)
  line L24 (-18, 0) -> (-19, 0)
  line L25 (-19, 0) -> (-19, -5.5)
  line L26 (-18, 0) -> (-19, 0)
  arc A12 (-13.5, 4.5) -> (-18, 0) centre (-13.5, 0) ccw
  line L27 (-13.5, 4.5) -> (-13.5, 5.5)
  arc A13 (-13.5, 5.5) -> (-19, 0) centre (-13.5, 0) ccw
